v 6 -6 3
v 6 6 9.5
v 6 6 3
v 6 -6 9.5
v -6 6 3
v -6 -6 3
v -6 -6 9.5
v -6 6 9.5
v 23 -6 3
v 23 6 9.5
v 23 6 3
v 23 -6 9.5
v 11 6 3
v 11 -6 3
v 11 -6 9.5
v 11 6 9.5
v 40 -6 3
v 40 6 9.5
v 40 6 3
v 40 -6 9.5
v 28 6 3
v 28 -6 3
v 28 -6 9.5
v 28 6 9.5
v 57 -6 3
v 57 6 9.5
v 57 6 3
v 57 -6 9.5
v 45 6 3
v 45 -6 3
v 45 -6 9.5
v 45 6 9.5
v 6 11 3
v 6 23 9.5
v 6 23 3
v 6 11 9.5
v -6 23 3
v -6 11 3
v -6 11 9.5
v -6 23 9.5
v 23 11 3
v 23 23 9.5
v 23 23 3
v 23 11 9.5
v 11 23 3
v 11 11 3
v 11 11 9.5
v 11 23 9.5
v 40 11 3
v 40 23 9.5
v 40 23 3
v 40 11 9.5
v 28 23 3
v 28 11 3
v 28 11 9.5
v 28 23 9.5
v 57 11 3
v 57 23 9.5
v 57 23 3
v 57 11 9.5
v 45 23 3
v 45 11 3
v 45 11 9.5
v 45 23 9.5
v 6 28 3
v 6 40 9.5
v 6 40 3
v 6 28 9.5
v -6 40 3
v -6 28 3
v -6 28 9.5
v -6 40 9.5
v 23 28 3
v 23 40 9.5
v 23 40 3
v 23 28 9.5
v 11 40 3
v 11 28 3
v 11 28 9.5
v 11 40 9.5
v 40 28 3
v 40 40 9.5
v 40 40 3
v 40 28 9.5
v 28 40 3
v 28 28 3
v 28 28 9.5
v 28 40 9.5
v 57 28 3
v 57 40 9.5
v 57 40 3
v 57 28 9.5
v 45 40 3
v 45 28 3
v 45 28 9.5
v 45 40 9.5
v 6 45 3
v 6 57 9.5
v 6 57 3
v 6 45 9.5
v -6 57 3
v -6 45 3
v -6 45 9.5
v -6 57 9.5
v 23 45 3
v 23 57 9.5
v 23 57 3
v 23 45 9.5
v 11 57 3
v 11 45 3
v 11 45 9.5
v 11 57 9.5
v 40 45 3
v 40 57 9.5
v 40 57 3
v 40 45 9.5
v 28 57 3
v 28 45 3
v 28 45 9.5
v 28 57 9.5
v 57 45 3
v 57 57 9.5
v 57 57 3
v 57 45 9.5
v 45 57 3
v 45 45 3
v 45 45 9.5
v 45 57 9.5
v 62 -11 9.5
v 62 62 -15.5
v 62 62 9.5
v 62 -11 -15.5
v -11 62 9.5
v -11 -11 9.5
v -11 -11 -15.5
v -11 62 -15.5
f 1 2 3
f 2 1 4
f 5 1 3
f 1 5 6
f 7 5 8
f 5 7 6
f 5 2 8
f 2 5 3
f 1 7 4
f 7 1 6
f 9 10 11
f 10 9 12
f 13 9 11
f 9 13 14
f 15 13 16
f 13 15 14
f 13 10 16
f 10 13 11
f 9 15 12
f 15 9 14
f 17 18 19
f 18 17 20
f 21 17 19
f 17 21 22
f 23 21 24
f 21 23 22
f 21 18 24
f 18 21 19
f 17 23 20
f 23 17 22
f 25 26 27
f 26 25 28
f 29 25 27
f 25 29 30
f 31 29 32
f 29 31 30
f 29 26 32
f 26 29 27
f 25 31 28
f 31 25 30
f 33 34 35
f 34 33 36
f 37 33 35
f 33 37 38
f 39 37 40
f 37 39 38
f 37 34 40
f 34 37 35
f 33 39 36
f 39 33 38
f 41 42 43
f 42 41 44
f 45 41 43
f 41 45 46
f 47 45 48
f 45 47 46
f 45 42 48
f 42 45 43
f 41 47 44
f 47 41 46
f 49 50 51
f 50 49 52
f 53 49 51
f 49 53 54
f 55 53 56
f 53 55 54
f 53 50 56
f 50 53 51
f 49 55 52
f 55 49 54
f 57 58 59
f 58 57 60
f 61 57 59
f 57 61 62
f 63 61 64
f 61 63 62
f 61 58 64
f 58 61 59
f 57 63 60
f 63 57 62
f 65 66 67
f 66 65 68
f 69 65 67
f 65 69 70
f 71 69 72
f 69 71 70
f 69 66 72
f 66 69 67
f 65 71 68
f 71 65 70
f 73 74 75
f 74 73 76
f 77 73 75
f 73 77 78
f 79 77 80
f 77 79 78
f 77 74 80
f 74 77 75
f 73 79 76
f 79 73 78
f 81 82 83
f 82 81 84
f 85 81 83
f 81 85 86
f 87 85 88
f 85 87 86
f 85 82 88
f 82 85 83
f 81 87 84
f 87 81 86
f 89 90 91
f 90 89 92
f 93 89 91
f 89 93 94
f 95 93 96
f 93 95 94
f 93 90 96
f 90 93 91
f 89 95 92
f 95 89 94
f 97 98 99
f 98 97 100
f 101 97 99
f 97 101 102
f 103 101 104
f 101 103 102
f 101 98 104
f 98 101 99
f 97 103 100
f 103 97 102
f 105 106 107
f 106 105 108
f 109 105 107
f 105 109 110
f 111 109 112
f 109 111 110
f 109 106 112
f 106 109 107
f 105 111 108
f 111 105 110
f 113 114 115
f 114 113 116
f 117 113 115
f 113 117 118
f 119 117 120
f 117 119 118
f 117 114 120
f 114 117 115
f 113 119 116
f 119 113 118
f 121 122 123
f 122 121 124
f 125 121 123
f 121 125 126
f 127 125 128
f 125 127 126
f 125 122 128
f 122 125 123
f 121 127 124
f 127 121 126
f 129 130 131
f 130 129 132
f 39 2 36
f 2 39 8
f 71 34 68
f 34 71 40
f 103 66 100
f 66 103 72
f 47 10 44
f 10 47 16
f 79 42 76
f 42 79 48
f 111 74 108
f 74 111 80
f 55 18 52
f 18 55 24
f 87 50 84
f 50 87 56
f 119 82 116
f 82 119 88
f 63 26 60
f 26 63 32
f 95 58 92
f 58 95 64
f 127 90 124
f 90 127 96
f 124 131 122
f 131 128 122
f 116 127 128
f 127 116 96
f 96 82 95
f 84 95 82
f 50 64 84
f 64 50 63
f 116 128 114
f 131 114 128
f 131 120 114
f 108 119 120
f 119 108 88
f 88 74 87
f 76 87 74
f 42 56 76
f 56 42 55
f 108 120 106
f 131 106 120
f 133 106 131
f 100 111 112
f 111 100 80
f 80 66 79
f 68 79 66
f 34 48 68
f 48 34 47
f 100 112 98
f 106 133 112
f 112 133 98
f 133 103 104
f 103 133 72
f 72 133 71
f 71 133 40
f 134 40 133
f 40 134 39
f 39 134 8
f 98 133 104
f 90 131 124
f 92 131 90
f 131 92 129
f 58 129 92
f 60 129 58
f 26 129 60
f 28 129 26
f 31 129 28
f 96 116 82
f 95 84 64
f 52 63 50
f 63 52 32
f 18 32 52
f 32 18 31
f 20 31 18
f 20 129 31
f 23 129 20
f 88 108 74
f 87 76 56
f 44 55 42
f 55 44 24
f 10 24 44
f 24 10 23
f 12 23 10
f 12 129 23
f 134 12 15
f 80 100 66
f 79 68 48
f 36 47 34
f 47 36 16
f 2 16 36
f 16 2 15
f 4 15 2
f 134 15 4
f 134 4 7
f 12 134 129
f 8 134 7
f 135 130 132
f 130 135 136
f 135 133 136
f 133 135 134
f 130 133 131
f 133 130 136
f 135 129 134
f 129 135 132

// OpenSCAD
/*
CNC End Mills Holder (c) by Jorge Monteiro

CNC End Mills Holder is licensed under a
Creative Commons Attribution-ShareAlike 4.0 International.

You should have received a copy of the license along with this
work.  If not, see <http://creativecommons.org/licenses/by-sa/4.0/>.
*/

/* [Basics] */
// Space between end mills in mm
endMillGap = 5;
// Diameter of end mill in mm
endMillSize = 12;
// Number of end mills you want to store per row
endMillsPerRow = 4;
// Number of end mills you want to store per column
endMillsPerColumn = 4;
// Height of the end mill box in mm
height = 25;
// Base of the box in mm
baseHeight = 3;

/* [Ignore] */
$fn=40*1;
endMillDim = endMillSize/2;
width = endMillsPerRow * (endMillGap + endMillSize) + endMillGap;
length = endMillsPerColumn * (endMillGap + endMillSize) + endMillGap;
endMillHeight = height - baseHeight;

difference() {
    
    translate([length/2-(endMillGap+endMillDim), width/2-(endMillGap+endMillDim), -3]) cube([length, width, height], center = true);
    drawEndMillHolders();
};

module drawEndMillHolders() {
     for(row = [0 : 1 : endMillsPerRow-1]) {
         for(column = [0 : 1 : endMillsPerColumn-1]) {
            translate([(endMillGap+endMillSize)*column, (endMillGap+endMillSize)*row, height-endMillHeight/2]) cube([endMillSize, endMillSize, endMillHeight], true);
         }
     }

}

module roundedCube(xdim, ydim, zdim, rdim) {
    translate([-xdim/2,-ydim/2,0]){
        hull(){
            translate([rdim,rdim,0]) cylinder(r=rdim, h=zdim);
            translate([xdim-rdim,rdim,0]) cylinder(r=rdim, h=zdim);

            translate([rdim,ydim-rdim,0]) cylinder(r=rdim, h=zdim);
            translate([xdim-rdim,ydim-rdim,0]) cylinder(r=rdim, h=zdim);

        };
    };
};
